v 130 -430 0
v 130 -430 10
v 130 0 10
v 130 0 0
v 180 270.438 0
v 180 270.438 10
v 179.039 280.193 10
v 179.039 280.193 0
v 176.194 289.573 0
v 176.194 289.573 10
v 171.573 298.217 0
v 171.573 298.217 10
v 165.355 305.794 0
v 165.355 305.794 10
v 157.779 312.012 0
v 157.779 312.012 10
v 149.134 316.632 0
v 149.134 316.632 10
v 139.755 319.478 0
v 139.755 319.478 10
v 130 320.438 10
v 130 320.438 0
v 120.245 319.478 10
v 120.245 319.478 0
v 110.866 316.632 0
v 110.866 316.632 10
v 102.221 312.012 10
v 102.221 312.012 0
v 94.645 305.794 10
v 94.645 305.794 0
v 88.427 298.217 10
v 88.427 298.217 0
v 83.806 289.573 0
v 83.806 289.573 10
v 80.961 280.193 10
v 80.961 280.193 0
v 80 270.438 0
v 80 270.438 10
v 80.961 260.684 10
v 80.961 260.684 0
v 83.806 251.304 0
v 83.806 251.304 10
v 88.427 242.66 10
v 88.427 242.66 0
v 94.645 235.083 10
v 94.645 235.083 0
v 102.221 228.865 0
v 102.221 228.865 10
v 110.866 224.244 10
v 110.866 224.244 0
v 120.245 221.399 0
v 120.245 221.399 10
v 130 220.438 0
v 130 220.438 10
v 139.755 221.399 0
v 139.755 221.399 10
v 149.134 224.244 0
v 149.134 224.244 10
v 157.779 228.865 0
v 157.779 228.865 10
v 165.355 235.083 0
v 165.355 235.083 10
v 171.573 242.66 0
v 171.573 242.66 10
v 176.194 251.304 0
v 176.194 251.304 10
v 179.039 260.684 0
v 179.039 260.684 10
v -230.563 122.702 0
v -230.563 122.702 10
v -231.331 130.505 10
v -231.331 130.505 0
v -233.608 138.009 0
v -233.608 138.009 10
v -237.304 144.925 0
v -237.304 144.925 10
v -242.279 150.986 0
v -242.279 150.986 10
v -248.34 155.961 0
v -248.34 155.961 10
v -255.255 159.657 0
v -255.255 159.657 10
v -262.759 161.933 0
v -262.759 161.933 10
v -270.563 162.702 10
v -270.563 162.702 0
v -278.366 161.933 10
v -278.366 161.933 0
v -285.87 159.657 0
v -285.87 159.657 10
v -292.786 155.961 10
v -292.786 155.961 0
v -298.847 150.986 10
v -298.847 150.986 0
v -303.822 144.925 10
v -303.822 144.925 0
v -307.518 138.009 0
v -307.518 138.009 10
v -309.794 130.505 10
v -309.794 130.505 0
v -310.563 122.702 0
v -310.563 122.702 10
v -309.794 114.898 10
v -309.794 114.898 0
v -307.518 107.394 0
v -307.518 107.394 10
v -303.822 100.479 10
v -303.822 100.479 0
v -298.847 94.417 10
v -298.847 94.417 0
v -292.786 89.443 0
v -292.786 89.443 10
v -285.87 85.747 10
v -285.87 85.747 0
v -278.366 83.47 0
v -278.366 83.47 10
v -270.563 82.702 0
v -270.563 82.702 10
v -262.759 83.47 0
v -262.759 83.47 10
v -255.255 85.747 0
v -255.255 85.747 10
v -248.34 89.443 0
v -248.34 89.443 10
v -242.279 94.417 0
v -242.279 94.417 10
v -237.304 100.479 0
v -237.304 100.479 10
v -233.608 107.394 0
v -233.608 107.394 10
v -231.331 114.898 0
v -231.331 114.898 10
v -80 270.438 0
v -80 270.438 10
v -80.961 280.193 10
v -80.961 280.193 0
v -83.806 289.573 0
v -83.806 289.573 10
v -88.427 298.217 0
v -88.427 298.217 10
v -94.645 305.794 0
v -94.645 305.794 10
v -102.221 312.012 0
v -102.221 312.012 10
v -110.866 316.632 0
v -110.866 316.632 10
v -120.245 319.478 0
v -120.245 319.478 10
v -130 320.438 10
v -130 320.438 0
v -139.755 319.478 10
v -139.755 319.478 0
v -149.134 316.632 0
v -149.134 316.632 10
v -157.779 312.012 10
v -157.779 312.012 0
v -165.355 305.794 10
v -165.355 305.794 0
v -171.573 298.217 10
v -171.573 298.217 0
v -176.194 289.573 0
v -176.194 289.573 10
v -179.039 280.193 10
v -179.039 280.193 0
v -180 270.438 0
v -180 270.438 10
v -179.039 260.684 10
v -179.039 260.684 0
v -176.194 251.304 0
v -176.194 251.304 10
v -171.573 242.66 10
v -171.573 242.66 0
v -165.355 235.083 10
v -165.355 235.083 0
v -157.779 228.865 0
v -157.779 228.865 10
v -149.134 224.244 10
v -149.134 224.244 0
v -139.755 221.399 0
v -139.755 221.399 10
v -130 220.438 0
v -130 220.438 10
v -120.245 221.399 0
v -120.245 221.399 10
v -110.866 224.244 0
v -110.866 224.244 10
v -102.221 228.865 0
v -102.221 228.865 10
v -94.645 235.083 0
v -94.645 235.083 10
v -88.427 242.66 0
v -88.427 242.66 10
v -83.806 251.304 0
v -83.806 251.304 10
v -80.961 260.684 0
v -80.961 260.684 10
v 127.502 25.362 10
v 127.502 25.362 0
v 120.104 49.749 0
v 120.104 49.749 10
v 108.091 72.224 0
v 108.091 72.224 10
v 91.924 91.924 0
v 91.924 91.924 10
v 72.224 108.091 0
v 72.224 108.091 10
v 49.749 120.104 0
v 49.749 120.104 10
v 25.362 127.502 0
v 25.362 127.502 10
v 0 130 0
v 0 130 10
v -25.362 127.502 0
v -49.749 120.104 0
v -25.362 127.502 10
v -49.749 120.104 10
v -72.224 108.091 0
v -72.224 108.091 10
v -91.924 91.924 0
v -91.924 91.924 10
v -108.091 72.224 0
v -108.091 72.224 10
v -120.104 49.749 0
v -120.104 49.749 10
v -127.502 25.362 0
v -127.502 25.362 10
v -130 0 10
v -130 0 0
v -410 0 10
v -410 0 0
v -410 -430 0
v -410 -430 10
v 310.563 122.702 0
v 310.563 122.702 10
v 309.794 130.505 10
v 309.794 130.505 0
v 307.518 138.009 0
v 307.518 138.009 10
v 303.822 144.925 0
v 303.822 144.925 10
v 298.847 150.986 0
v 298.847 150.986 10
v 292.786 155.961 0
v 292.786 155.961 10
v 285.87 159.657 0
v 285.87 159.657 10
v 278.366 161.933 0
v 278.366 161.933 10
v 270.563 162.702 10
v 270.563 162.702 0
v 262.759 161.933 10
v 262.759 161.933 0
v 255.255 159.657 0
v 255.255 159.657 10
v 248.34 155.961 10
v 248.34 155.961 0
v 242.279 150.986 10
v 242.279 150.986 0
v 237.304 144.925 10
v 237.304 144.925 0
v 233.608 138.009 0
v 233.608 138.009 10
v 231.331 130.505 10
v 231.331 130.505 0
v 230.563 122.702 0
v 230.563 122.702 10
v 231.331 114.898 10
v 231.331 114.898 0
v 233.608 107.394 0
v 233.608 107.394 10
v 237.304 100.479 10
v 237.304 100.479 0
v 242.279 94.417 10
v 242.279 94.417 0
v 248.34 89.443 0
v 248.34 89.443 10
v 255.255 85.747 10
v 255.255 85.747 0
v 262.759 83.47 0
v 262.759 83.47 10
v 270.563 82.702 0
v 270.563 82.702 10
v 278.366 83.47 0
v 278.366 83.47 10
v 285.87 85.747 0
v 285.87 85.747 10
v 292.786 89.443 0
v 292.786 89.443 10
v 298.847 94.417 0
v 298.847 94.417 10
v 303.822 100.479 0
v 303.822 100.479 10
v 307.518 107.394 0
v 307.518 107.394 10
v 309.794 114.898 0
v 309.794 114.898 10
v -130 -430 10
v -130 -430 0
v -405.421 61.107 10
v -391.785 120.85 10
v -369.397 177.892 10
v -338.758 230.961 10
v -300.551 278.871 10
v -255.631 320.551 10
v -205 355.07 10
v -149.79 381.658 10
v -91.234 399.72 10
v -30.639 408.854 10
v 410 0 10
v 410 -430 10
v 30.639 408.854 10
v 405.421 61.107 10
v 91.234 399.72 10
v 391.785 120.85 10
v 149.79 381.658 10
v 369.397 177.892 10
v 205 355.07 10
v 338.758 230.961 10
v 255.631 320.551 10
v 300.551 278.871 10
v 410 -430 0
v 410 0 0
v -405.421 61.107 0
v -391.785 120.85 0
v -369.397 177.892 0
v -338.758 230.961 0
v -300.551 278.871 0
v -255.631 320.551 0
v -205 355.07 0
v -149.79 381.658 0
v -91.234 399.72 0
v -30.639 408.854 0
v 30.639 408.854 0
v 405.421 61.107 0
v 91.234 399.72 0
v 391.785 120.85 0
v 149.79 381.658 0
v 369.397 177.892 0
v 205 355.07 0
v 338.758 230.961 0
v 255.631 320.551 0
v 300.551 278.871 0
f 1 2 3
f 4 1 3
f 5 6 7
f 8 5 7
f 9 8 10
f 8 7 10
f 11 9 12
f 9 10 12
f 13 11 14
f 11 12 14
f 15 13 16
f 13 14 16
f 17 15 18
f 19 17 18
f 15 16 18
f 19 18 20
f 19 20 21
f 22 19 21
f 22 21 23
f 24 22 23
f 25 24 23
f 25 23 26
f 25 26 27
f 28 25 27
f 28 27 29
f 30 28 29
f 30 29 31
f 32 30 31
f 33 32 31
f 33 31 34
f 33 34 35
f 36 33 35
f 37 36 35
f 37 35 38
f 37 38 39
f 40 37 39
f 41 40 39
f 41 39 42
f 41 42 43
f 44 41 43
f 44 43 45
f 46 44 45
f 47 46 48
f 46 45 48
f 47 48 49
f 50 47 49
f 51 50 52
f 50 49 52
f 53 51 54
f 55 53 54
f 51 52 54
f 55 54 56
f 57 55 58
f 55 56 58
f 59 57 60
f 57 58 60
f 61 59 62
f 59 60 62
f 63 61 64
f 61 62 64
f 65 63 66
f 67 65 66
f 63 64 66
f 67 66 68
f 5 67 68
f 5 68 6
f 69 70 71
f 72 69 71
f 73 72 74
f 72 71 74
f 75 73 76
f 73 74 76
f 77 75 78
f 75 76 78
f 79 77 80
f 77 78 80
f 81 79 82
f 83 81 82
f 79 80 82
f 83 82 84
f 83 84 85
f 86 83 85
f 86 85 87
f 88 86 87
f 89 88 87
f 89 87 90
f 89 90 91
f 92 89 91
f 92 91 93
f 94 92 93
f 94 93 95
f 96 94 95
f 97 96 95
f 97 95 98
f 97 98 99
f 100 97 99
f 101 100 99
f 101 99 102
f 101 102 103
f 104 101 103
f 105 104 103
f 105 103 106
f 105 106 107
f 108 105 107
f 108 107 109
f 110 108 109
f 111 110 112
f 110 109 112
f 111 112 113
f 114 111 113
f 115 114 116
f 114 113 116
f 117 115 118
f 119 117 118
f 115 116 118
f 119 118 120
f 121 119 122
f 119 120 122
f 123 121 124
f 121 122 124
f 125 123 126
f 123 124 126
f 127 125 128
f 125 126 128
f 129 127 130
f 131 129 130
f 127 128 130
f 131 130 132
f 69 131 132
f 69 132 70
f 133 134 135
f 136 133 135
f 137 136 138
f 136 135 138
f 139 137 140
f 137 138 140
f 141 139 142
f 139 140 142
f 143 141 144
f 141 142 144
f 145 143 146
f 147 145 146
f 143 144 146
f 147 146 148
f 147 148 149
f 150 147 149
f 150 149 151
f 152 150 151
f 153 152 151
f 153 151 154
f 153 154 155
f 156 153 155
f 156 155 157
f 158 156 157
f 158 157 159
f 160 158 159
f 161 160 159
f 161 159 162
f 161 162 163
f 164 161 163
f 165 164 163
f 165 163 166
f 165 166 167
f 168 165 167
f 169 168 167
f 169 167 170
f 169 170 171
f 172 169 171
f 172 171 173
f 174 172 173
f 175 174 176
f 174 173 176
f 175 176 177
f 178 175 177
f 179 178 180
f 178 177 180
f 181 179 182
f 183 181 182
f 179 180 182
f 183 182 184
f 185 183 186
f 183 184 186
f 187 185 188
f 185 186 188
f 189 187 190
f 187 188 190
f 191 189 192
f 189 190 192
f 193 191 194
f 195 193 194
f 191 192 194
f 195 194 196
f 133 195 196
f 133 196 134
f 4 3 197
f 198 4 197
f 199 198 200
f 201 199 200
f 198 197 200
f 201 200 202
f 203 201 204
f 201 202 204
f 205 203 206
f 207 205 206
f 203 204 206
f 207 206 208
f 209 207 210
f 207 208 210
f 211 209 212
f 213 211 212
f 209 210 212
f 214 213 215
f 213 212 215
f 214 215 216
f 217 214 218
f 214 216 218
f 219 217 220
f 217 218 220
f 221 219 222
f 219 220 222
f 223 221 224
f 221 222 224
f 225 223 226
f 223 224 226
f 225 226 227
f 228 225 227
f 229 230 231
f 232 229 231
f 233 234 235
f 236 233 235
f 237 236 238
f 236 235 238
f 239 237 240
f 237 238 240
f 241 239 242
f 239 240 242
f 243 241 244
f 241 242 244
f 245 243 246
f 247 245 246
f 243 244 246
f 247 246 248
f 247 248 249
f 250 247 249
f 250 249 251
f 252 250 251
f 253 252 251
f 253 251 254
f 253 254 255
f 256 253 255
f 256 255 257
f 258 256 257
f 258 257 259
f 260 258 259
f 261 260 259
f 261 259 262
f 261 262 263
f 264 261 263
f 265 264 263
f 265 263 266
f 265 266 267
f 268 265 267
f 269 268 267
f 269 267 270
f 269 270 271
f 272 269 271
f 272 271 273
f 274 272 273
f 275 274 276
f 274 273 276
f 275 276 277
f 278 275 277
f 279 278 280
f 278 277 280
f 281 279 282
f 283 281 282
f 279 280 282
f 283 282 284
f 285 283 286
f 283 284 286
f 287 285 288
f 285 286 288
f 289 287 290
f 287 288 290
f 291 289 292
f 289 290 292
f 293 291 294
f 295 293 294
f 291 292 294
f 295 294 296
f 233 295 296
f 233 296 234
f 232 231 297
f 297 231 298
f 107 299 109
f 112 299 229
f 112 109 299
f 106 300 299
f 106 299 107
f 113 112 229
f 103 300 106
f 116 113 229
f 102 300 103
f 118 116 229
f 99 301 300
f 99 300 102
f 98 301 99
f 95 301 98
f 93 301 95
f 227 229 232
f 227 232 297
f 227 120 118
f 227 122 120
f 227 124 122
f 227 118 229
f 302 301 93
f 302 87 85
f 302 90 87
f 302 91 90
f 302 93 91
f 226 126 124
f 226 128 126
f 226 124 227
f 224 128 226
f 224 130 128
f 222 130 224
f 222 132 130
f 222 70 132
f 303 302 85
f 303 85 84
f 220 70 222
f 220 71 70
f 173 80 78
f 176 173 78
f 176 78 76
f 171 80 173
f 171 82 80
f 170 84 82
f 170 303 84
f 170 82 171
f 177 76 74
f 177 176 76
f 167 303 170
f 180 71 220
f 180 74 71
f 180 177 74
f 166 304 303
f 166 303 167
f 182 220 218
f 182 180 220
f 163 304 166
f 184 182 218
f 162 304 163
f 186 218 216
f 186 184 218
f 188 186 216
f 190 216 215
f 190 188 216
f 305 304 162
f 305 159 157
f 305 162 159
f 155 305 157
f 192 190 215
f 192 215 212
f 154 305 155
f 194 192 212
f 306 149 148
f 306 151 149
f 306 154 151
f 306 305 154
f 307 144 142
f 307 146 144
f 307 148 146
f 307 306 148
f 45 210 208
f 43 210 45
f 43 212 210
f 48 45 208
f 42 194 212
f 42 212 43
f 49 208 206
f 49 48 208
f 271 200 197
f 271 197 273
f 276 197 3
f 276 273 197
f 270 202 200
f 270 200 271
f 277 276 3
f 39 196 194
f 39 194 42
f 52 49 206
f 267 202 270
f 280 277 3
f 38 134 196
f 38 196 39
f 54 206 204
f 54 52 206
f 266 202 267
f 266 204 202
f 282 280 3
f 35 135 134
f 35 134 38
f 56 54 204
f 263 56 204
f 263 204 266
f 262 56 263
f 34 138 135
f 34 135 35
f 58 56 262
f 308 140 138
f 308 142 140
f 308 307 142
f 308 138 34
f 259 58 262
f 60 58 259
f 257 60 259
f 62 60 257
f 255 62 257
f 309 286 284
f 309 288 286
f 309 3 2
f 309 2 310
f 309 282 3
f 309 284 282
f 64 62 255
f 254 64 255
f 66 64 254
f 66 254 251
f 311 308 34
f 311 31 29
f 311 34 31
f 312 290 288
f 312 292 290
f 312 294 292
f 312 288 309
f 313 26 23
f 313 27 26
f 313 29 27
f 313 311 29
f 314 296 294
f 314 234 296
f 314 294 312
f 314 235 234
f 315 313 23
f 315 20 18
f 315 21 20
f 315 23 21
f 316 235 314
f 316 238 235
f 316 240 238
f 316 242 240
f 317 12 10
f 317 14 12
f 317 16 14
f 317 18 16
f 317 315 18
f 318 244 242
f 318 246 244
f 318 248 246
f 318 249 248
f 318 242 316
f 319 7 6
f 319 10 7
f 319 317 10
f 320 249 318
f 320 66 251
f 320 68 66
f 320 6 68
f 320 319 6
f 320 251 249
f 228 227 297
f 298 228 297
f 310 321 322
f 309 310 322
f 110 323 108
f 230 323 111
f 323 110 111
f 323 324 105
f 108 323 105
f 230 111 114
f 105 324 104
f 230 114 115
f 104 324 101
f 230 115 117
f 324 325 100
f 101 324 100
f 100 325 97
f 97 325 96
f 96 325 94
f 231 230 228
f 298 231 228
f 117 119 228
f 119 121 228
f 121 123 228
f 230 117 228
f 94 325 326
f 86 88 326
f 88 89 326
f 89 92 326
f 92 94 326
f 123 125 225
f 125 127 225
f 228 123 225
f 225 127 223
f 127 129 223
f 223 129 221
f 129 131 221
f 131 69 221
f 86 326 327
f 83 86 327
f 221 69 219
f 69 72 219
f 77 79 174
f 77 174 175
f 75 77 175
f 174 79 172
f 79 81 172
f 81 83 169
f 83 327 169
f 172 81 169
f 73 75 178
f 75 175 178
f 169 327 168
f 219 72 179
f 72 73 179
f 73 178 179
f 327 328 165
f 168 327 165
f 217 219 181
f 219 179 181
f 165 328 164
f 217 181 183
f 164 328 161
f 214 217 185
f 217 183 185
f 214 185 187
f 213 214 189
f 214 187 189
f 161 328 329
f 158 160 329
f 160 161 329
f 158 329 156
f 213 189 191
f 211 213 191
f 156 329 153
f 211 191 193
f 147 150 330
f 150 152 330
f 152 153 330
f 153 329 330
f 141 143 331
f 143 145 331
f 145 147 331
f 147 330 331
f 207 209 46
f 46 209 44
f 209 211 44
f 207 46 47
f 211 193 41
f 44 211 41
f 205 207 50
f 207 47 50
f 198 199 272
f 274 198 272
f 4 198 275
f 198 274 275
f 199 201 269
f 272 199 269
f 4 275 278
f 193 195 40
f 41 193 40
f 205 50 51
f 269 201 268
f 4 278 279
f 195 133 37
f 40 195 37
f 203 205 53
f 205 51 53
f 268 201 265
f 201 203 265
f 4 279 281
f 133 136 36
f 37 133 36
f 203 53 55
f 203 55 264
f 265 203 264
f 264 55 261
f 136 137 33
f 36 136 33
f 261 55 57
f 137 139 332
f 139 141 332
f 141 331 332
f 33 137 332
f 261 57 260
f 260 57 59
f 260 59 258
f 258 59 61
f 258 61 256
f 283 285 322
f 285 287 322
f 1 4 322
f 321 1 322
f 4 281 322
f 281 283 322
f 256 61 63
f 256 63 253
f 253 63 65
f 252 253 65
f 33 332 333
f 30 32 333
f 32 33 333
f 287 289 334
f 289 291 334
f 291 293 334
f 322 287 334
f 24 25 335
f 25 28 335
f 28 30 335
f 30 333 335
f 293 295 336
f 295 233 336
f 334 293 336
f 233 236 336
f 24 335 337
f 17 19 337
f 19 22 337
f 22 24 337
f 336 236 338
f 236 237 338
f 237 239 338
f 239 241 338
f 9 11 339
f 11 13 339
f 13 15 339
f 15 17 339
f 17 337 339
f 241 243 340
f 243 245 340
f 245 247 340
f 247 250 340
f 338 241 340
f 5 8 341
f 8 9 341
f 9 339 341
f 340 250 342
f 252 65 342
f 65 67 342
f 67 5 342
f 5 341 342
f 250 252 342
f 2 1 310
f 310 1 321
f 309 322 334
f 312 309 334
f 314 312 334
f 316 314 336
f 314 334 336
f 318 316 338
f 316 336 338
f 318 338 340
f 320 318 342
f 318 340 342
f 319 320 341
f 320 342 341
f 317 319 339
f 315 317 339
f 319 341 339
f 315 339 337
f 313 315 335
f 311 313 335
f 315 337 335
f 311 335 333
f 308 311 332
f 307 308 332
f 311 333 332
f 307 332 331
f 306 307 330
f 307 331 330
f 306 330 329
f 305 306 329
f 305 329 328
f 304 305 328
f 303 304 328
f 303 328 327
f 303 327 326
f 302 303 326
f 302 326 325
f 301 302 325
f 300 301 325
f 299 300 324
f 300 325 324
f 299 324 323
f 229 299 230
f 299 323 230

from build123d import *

# Parameters (mm, degrees)
EXTRUDE_1_DEPTH     = 10
SKETCH_3_R          = 50
SKETCH_3_R_2        = 40
CUT_EXTRUDE_3_DEPTH = 50


with BuildPart() as part:
    # 草图1 → 凸台-拉伸1 (new body)
    with BuildSketch(Plane.XY):
        with BuildLine():
            Line((-410, 0), (-410, -430))
            Line((-410, -430), (410, -430))
            Line((410, -430), (410, 0))
            ThreePointArc((410, 0), (0, 410), (-410, 0))
        make_face()
    extrude(amount=EXTRUDE_1_DEPTH)

    # 草图3 → 切除-拉伸3 (cut)
    with BuildSketch(Plane.XY.offset(10)):
        with Locations((-130, 270.438352594)):
            Circle(SKETCH_3_R)
        with Locations((130, 270.438352594)):
            Circle(SKETCH_3_R)
        with Locations((-270.562773315, 122.70173436)):
            Circle(SKETCH_3_R_2)
        with Locations((270.562773315, 122.70173436)):
            Circle(SKETCH_3_R_2)
        with BuildLine():
            Line((-130, 0), (-130, -430))
            Line((-130, -430), (130, -430))
            Line((130, -430), (130, 0))
            ThreePointArc((130, 0), (0, 130), (-130, 0))
        make_face()
    extrude(amount=-CUT_EXTRUDE_3_DEPTH, mode=Mode.SUBTRACT)


solid = part.part
